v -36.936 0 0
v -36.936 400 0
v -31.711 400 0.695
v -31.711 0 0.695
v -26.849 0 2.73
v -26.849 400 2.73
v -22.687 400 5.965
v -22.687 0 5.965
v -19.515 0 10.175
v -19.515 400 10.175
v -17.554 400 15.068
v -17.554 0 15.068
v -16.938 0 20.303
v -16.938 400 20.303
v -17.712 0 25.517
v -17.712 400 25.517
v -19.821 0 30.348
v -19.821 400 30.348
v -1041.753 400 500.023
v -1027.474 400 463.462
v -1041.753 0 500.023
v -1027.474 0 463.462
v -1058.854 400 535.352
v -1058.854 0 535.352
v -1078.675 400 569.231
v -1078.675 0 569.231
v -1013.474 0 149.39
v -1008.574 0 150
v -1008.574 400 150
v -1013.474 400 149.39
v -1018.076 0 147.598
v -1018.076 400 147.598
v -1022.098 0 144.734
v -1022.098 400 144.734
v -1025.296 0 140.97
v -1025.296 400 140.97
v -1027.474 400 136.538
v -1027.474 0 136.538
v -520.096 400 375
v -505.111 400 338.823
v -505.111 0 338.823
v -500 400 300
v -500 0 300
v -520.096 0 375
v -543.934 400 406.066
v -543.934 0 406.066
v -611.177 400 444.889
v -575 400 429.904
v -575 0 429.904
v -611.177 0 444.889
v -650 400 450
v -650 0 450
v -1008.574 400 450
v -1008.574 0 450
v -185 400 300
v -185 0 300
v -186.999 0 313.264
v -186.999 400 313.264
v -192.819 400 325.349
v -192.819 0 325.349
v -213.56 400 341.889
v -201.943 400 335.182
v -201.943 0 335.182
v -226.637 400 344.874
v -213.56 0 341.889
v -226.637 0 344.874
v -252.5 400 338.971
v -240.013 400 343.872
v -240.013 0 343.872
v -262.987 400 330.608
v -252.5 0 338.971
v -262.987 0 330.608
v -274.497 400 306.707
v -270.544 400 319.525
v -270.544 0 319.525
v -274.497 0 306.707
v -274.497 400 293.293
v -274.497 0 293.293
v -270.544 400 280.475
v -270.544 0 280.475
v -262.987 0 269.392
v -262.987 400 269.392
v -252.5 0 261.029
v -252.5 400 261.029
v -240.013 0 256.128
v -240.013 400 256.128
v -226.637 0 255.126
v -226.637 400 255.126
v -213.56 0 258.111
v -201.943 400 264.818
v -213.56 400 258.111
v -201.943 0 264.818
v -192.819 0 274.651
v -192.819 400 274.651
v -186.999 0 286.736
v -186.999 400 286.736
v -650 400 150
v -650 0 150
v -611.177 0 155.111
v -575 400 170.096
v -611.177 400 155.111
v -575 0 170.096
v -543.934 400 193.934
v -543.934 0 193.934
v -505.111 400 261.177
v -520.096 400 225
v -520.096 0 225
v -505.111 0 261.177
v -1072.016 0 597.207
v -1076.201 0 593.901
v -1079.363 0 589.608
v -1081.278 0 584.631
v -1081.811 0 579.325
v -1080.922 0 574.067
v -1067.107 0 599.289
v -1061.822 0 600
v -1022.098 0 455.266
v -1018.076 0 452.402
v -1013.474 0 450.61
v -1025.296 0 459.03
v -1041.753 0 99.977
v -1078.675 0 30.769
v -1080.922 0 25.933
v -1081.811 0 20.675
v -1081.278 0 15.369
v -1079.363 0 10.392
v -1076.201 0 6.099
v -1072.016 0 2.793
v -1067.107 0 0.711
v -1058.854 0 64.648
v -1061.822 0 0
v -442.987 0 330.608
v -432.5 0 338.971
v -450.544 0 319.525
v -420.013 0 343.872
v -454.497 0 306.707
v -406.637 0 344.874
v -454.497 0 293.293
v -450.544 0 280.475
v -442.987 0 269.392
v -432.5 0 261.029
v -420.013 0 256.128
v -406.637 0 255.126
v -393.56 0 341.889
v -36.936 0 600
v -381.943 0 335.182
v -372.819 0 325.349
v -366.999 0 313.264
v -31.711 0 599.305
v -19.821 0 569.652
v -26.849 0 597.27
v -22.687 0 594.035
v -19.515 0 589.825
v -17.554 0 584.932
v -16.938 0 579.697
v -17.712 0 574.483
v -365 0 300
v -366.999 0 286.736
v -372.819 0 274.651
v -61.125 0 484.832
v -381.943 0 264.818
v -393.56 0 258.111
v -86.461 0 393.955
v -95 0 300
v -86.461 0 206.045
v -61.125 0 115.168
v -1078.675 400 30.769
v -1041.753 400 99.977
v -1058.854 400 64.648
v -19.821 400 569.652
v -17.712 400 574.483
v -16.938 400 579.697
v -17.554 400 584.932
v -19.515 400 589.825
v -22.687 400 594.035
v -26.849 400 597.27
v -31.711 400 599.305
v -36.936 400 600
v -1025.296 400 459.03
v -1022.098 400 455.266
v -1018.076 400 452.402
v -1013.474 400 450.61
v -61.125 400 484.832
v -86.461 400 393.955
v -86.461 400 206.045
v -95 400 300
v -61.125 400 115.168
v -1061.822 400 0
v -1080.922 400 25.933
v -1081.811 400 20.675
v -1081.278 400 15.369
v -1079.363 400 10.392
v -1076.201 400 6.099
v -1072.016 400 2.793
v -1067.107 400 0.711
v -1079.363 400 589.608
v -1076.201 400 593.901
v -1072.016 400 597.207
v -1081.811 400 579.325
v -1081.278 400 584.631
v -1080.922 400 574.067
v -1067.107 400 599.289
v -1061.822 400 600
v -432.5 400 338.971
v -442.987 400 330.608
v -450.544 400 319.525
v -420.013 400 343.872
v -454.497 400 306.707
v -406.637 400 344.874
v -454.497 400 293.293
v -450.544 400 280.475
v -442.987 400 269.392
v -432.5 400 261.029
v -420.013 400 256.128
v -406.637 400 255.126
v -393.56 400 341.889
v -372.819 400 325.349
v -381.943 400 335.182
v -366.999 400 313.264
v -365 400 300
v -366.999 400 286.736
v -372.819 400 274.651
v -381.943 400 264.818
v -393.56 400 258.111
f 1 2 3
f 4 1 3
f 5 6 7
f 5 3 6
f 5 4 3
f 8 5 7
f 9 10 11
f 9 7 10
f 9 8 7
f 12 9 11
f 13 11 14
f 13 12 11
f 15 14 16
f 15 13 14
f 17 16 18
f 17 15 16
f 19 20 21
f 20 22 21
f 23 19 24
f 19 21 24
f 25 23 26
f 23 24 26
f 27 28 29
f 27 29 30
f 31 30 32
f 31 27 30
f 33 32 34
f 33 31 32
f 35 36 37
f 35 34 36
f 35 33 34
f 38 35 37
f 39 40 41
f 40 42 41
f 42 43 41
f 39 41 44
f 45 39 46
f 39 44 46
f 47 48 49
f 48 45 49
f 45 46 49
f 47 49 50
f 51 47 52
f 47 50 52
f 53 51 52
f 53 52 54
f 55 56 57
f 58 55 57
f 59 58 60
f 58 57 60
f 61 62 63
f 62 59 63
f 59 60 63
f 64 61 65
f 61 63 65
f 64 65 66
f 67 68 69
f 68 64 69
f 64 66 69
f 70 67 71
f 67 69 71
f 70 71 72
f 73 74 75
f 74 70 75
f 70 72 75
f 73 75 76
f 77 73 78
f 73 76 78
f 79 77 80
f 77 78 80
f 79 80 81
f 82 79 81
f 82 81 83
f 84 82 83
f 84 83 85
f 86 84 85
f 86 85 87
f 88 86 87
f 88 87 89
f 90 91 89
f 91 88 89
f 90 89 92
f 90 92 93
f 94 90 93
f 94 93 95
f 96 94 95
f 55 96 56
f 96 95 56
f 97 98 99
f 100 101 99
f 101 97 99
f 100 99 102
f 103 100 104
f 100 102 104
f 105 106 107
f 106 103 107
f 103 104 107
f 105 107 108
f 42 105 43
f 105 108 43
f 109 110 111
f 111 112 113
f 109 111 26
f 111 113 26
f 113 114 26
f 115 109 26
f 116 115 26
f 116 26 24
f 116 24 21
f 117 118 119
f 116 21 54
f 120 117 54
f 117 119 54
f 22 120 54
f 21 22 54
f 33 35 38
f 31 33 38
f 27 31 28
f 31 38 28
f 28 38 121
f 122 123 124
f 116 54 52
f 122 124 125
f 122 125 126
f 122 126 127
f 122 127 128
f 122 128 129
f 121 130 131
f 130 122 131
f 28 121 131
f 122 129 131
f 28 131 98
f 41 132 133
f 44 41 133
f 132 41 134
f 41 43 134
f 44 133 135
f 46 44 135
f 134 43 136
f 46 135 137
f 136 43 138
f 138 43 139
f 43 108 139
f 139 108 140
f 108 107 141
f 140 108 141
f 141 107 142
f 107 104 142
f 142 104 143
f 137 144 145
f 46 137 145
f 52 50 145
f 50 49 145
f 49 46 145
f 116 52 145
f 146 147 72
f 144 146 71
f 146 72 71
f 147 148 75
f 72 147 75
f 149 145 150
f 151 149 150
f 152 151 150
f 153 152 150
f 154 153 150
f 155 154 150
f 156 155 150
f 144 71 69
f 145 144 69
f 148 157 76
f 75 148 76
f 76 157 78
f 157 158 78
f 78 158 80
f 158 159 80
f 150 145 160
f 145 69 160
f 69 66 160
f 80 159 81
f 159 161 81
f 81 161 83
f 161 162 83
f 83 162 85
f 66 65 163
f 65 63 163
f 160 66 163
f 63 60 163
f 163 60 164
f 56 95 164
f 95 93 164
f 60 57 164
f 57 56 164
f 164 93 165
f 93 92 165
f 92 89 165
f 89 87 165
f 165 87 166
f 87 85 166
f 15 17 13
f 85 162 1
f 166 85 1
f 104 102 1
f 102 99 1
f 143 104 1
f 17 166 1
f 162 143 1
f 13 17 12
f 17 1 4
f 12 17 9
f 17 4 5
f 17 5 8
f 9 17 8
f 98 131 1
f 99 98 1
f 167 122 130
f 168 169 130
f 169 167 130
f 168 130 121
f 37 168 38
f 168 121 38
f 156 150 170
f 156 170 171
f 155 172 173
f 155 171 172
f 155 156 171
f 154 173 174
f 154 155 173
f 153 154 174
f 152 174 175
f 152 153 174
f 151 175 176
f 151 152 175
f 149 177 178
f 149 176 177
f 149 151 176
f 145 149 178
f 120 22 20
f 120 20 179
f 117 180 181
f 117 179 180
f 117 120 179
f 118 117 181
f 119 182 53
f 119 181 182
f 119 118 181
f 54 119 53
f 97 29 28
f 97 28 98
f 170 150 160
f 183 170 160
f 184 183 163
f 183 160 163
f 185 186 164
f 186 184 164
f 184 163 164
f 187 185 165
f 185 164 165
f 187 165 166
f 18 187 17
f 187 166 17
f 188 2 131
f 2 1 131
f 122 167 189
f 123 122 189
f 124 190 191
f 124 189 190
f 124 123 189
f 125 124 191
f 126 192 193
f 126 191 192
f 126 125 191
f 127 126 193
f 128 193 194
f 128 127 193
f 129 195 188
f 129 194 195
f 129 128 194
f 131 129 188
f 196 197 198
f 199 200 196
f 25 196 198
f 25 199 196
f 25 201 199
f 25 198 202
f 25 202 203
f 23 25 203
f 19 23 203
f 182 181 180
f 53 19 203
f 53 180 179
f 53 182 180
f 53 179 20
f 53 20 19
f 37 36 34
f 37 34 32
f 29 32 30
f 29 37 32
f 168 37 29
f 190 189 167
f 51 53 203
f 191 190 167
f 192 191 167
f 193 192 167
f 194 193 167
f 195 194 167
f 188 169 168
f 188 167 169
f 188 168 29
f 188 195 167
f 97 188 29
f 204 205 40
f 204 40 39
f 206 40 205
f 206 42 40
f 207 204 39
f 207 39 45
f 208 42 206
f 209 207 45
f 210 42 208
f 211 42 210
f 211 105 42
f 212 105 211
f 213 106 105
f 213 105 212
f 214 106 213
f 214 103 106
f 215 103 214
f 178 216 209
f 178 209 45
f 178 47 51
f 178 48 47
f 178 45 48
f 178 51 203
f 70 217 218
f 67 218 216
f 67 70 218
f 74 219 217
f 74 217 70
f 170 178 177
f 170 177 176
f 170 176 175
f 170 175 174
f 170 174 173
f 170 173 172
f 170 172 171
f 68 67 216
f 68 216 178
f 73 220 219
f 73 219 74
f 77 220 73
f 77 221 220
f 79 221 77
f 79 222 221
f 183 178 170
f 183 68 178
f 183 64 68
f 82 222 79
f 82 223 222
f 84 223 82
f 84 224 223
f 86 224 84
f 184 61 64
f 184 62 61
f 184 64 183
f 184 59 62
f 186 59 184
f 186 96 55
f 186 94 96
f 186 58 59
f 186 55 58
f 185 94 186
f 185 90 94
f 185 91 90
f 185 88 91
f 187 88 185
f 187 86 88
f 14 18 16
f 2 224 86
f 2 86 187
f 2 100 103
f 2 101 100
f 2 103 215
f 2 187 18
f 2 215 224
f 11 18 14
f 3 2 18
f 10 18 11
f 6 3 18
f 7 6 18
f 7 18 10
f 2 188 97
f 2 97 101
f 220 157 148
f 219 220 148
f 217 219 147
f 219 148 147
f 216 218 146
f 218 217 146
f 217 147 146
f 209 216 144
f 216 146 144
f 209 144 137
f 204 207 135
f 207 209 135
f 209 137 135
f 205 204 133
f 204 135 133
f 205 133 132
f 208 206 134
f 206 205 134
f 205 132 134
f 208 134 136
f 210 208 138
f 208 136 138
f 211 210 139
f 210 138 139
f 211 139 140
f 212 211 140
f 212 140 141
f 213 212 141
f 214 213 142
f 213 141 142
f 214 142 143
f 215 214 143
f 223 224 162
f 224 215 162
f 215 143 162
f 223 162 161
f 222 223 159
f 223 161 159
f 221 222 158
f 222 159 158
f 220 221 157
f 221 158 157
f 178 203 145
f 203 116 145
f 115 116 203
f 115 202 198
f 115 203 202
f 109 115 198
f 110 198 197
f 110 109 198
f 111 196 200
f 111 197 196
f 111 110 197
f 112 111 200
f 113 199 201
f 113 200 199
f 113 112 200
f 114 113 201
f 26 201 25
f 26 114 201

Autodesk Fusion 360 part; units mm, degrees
sketch "Boceto2" plane through (0, 0, 0) normal (0, 1, 0) x (1, 0, 0)
  line L0 (-36.936, 0) -> (-1061.822, 0)
  line L1 (-1061.822, -600) -> (-36.936, -600)
  line L2 (-1008.5735, -150) -> (-650, -150)
  line L3 (-650, -450) -> (-1008.5735, -450)
  arc A0 (-1078.675, -569.2308) -> (-1027.4745, -463.4615) centre (-1500, -300) ccw
  arc A1 (-1027.4745, -136.5385) -> (-1078.675, -30.7692) centre (-1500, -300) ccw
  arc A2 (-650, -450) -> (-500, -300) centre (-650, -300) ccw
  arc A3 (-500, -300) -> (-650, -150) centre (-650, -300) ccw
  circle A4 centre (-410, -300) radius 45
  circle A5 centre (-230, -300) radius 45
  arc A6 (-19.821, -30.3477) -> (-19.821, -569.6523) centre (426.1842, -300) ccw
  arc A7 (-1078.675, -569.2308) -> (-1061.822, -600) centre (-1061.822, -580) ccw
  arc A8 (-36.936, -600) -> (-19.821, -569.6523) centre (-36.936, -580) ccw
  arc A9 (-19.821, -30.3477) -> (-36.936, 0) centre (-36.936, -20) ccw
  arc A10 (-1061.822, 0) -> (-1078.675, -30.7692) centre (-1061.822, -20) ccw
  arc A11 (-1027.4745, -136.5385) -> (-1008.5735, -150) centre (-1008.5735, -130) ccw
  arc A12 (-1008.5735, -450) -> (-1027.4745, -463.4615) centre (-1008.5735, -470) ccw
  point P0 (-1100, 0)
  point P1 (0, -600)
  point P2 (-500, -150)
  point P3 (-500, -450)
  dimension "d1" = 1100
  dimension "d2" = 600
  dimension "d6" = 300
  dimension "d13" = 150
  dimension "d14" = 150
  dimension "d15" = 90
  dimension "d16" = 90
  dimension "d17" = 180
  dimension "d18" = 90
  dimension "d20" = 20
  dimension "d21" = 20
  dimension "d22" = 20
  dimension "d23" = 20
  dimension "d24" = 20
  dimension "d25" = 20
extrude "Extruir1" add sketch "Boceto2" along normal blind 400
